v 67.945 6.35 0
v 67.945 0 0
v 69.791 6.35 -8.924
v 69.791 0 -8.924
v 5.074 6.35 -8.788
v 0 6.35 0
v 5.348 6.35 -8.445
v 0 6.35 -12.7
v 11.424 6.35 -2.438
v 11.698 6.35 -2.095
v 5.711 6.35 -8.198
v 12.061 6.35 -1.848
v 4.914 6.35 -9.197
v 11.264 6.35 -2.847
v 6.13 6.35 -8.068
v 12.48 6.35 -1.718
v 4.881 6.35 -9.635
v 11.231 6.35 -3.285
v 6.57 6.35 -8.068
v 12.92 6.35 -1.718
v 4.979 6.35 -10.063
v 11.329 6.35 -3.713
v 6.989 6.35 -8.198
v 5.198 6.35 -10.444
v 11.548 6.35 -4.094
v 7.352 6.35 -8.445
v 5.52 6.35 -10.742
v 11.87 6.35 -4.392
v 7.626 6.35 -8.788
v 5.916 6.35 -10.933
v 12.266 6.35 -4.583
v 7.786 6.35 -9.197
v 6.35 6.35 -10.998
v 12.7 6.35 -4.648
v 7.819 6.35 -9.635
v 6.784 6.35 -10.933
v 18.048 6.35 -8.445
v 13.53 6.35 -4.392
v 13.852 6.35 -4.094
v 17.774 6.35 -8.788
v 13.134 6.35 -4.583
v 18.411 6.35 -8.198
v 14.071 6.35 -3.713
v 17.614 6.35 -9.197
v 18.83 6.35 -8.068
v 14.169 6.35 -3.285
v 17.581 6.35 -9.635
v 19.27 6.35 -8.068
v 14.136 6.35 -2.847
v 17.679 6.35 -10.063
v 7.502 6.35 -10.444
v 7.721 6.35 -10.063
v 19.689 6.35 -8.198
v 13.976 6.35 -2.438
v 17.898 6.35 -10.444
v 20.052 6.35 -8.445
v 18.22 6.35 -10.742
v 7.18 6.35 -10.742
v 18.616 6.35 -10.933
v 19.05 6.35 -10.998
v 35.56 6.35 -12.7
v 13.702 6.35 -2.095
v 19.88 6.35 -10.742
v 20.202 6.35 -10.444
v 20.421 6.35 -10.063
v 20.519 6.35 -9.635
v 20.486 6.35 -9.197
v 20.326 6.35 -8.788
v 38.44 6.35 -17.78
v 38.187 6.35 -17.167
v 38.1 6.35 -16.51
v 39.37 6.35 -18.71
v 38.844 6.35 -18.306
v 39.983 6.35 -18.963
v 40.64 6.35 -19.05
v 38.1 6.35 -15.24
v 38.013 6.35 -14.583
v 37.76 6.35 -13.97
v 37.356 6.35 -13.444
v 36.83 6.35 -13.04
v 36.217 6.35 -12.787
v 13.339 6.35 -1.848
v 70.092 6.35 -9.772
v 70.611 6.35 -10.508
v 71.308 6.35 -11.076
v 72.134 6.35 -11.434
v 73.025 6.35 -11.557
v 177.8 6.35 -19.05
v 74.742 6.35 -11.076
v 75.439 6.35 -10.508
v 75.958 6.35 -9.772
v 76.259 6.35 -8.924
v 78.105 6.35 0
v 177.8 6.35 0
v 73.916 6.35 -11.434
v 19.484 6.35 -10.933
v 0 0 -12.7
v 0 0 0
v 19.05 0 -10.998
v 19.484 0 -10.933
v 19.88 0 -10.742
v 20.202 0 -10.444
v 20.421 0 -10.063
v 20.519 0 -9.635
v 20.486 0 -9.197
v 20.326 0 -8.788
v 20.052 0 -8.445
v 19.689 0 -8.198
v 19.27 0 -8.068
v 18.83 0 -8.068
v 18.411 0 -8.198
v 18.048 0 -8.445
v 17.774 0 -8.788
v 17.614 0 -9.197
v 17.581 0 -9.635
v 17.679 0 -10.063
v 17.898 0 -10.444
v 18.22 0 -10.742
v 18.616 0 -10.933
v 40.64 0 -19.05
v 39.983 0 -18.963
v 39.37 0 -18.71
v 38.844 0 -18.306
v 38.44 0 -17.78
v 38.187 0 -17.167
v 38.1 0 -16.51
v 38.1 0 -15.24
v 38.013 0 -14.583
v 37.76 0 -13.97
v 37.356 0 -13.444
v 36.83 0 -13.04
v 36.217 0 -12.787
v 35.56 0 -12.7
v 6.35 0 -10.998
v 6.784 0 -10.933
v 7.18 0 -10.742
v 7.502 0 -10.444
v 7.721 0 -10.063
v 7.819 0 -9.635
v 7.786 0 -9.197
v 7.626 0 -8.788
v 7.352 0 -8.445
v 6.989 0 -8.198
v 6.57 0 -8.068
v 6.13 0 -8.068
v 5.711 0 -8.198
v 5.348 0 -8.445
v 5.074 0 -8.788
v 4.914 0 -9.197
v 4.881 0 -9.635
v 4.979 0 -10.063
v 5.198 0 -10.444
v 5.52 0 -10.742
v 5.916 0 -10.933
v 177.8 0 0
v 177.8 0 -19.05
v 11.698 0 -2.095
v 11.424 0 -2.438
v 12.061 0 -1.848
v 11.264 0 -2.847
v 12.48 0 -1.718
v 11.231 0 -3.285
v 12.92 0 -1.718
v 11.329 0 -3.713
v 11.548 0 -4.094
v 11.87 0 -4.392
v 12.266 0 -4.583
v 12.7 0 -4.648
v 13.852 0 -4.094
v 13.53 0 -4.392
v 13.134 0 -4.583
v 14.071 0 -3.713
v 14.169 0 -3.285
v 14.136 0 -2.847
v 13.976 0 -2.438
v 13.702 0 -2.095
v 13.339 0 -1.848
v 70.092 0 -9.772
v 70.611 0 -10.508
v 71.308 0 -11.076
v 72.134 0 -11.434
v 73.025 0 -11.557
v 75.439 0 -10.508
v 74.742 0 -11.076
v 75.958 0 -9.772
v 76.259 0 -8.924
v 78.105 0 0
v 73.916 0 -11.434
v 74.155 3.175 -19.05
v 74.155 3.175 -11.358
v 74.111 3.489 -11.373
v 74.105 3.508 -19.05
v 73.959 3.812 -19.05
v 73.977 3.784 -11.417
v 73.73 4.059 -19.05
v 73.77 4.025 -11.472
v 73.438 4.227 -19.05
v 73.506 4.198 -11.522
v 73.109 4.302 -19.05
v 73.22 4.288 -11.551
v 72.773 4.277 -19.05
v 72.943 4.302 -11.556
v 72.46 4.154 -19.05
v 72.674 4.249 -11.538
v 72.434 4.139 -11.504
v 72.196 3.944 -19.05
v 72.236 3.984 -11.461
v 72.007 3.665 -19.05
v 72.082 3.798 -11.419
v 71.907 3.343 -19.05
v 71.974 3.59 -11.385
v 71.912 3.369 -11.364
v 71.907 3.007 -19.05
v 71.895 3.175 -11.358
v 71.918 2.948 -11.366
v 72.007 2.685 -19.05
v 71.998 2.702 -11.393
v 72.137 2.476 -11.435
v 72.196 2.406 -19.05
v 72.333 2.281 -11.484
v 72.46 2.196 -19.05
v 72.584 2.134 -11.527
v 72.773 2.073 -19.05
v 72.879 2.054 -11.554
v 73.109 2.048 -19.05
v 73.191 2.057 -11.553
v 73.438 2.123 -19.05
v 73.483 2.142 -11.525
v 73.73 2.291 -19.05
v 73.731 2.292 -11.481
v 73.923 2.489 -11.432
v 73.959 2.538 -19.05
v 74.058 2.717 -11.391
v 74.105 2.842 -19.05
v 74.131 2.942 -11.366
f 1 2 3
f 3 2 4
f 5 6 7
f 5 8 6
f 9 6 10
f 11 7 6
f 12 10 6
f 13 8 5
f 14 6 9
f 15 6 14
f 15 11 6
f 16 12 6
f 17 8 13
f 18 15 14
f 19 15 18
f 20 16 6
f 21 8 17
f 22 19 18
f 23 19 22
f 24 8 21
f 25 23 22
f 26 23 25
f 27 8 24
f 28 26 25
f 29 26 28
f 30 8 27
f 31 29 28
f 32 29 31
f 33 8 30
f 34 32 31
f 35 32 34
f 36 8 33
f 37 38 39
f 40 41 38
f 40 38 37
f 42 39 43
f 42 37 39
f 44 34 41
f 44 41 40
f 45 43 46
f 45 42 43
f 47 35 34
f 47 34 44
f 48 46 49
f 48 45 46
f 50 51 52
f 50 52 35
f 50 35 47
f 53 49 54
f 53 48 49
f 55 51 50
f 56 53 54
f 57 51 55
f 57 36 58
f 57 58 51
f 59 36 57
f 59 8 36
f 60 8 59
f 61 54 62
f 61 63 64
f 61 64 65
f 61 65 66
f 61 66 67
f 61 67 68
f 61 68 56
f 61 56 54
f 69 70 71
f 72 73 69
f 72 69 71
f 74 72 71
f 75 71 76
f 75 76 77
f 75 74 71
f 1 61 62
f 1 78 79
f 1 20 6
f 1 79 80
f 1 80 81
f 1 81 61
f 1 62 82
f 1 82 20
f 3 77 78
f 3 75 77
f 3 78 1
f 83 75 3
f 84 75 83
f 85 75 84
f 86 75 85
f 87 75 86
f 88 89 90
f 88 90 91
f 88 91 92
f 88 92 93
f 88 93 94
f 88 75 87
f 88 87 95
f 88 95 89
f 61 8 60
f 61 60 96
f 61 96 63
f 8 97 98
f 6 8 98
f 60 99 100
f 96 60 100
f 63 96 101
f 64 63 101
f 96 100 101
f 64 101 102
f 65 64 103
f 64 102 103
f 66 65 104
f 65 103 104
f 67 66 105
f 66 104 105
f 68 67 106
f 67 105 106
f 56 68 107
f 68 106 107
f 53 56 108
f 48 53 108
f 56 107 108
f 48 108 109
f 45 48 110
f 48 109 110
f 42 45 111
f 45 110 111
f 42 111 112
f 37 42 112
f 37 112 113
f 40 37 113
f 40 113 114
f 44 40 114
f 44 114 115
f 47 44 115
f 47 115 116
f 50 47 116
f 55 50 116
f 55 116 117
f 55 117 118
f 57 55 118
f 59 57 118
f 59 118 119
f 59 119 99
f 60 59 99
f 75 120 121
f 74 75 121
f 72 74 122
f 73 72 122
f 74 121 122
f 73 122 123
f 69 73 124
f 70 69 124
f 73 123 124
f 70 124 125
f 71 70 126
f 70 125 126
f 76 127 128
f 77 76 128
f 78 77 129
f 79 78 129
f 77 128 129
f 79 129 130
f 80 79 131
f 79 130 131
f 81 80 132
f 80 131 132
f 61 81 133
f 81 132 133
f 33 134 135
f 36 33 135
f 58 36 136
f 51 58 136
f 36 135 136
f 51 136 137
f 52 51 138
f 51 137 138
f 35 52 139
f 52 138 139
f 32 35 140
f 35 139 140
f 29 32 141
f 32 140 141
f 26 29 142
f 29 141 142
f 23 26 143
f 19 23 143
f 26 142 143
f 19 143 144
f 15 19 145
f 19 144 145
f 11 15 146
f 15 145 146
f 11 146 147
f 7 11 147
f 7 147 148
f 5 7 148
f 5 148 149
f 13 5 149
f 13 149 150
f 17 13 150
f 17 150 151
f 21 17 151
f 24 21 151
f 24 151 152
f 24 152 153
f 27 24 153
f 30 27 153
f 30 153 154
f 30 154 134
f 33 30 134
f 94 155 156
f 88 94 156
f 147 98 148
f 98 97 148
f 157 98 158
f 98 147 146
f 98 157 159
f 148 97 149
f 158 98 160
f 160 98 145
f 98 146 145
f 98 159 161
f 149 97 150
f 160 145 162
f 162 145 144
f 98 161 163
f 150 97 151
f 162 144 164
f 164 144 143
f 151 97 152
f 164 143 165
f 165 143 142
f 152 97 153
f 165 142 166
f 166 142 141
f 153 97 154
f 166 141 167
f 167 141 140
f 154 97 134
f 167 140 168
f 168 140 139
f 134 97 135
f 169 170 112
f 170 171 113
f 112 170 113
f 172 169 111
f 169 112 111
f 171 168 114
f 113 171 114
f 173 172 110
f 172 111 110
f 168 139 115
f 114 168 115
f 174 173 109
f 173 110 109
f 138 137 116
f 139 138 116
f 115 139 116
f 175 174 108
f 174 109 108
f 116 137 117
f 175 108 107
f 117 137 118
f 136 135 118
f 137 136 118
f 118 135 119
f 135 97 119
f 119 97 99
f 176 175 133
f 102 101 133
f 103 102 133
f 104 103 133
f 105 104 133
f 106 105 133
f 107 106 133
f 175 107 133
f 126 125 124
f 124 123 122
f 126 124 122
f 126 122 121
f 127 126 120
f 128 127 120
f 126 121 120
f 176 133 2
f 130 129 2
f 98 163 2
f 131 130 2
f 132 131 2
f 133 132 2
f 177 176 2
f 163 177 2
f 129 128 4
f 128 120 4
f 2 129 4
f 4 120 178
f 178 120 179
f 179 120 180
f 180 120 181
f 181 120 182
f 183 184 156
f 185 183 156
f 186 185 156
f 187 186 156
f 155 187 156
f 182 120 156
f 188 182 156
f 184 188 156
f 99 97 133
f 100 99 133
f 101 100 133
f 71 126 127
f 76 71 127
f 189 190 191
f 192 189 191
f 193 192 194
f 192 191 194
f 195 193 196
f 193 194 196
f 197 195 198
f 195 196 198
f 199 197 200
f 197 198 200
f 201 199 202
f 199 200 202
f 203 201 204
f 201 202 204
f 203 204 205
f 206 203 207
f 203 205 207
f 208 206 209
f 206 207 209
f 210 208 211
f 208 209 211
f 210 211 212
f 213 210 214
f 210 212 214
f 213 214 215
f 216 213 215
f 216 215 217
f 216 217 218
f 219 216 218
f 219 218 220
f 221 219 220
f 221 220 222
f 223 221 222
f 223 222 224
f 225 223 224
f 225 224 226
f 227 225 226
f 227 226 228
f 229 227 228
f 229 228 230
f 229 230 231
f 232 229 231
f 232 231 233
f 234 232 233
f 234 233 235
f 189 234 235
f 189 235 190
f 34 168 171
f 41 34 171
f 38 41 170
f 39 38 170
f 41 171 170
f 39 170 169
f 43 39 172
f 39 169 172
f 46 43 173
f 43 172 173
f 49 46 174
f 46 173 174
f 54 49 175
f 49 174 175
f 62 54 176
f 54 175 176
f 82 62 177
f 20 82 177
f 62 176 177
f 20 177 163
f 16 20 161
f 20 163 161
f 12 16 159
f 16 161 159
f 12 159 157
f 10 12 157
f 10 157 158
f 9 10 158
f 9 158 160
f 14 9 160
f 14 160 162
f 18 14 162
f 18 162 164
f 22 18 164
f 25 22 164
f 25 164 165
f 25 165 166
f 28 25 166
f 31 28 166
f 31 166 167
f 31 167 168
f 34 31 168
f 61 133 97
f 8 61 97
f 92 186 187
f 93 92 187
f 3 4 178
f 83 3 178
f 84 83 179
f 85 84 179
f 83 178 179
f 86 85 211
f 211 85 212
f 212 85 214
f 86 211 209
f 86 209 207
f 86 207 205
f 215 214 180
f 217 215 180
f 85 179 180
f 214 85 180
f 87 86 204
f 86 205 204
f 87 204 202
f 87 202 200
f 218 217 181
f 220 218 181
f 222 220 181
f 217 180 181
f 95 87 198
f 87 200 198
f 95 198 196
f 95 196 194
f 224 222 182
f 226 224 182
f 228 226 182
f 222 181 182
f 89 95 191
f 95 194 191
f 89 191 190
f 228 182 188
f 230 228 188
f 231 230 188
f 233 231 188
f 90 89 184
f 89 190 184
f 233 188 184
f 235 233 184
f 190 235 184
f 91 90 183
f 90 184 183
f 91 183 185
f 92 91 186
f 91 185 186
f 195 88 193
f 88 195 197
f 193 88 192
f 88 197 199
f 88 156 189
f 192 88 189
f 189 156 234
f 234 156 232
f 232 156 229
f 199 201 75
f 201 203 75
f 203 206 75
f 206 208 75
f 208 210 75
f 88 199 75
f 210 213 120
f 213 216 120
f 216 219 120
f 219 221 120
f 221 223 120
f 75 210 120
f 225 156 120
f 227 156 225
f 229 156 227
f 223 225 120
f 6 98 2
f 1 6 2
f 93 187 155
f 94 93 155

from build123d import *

# Parameters (mm, degrees)
BOSS_EXTRUDE1_DEPTH             = 6.35
F_32_0_116_DIAMETER_HOLE1_D     = 2.9464
F_32_0_116_DIAMETER_HOLE1_DEPTH = 7.62
F_32_0_116_DIAMETER_HOLE1_TIP   = 0.885187864
F_4_40_TAPPED_HOLE1_D           = 2.2606


with BuildPart() as part:
    # Sketch1 → Boss-Extrude1 (new body)
    with BuildSketch(Plane(origin=(0, 0, 0), x_dir=(1, 0, 0), z_dir=(0, 1, 0))):
        with BuildLine():
            Line((0, 0), (67.945, 0))
            Line((67.945, 0), (69.791491908, 8.924051134))
            ThreePointArc((69.791491908, 8.924051134), (73.025, 11.557), (76.258508092, 8.924051134))
            Line((76.258508092, 8.924051134), (78.105, 0))
            Line((78.105, 0), (177.8, 0))
            Line((177.8, 0), (177.8, 19.05))
            Line((177.8, 19.05), (40.64, 19.05))
            ThreePointArc((40.64, 19.05), (38.843948776, 18.306051224), (38.1, 16.51))
            Line((38.1, 16.51), (38.1, 15.24))
            ThreePointArc((38.1, 15.24), (37.356051224, 13.443948776), (35.56, 12.7))
            Line((35.56, 12.7), (0, 12.7))
            Line((0, 12.7), (0, 0))
        make_face()
    extrude(amount=BOSS_EXTRUDE1_DEPTH)

    # #32 (0.116) Diameter Hole1
    with Locations(Plane(origin=(6.35, 6.35, -9.525), x_dir=(0, 0, 1), z_dir=(0, 1, 0))):
        with Locations((0, 0), (0, 12.7), (6.35, 6.35)):
            Hole(F_32_0_116_DIAMETER_HOLE1_D / 2, depth=F_32_0_116_DIAMETER_HOLE1_DEPTH)
            with Locations((0, 0, -(F_32_0_116_DIAMETER_HOLE1_DEPTH + F_32_0_116_DIAMETER_HOLE1_TIP / 2))):  # 118° drill point
                Cone(0, F_32_0_116_DIAMETER_HOLE1_D / 2, F_32_0_116_DIAMETER_HOLE1_TIP, mode=Mode.SUBTRACT)

    # #4-40 Tapped Hole1 (through all)
    with Locations(Plane(origin=(0, 0, -19.05), x_dir=(-1, 0, 0), z_dir=(0, 0, -1))):
        with Locations((-73.025, 3.175)):
            Hole(F_4_40_TAPPED_HOLE1_D / 2)


solid = part.part
